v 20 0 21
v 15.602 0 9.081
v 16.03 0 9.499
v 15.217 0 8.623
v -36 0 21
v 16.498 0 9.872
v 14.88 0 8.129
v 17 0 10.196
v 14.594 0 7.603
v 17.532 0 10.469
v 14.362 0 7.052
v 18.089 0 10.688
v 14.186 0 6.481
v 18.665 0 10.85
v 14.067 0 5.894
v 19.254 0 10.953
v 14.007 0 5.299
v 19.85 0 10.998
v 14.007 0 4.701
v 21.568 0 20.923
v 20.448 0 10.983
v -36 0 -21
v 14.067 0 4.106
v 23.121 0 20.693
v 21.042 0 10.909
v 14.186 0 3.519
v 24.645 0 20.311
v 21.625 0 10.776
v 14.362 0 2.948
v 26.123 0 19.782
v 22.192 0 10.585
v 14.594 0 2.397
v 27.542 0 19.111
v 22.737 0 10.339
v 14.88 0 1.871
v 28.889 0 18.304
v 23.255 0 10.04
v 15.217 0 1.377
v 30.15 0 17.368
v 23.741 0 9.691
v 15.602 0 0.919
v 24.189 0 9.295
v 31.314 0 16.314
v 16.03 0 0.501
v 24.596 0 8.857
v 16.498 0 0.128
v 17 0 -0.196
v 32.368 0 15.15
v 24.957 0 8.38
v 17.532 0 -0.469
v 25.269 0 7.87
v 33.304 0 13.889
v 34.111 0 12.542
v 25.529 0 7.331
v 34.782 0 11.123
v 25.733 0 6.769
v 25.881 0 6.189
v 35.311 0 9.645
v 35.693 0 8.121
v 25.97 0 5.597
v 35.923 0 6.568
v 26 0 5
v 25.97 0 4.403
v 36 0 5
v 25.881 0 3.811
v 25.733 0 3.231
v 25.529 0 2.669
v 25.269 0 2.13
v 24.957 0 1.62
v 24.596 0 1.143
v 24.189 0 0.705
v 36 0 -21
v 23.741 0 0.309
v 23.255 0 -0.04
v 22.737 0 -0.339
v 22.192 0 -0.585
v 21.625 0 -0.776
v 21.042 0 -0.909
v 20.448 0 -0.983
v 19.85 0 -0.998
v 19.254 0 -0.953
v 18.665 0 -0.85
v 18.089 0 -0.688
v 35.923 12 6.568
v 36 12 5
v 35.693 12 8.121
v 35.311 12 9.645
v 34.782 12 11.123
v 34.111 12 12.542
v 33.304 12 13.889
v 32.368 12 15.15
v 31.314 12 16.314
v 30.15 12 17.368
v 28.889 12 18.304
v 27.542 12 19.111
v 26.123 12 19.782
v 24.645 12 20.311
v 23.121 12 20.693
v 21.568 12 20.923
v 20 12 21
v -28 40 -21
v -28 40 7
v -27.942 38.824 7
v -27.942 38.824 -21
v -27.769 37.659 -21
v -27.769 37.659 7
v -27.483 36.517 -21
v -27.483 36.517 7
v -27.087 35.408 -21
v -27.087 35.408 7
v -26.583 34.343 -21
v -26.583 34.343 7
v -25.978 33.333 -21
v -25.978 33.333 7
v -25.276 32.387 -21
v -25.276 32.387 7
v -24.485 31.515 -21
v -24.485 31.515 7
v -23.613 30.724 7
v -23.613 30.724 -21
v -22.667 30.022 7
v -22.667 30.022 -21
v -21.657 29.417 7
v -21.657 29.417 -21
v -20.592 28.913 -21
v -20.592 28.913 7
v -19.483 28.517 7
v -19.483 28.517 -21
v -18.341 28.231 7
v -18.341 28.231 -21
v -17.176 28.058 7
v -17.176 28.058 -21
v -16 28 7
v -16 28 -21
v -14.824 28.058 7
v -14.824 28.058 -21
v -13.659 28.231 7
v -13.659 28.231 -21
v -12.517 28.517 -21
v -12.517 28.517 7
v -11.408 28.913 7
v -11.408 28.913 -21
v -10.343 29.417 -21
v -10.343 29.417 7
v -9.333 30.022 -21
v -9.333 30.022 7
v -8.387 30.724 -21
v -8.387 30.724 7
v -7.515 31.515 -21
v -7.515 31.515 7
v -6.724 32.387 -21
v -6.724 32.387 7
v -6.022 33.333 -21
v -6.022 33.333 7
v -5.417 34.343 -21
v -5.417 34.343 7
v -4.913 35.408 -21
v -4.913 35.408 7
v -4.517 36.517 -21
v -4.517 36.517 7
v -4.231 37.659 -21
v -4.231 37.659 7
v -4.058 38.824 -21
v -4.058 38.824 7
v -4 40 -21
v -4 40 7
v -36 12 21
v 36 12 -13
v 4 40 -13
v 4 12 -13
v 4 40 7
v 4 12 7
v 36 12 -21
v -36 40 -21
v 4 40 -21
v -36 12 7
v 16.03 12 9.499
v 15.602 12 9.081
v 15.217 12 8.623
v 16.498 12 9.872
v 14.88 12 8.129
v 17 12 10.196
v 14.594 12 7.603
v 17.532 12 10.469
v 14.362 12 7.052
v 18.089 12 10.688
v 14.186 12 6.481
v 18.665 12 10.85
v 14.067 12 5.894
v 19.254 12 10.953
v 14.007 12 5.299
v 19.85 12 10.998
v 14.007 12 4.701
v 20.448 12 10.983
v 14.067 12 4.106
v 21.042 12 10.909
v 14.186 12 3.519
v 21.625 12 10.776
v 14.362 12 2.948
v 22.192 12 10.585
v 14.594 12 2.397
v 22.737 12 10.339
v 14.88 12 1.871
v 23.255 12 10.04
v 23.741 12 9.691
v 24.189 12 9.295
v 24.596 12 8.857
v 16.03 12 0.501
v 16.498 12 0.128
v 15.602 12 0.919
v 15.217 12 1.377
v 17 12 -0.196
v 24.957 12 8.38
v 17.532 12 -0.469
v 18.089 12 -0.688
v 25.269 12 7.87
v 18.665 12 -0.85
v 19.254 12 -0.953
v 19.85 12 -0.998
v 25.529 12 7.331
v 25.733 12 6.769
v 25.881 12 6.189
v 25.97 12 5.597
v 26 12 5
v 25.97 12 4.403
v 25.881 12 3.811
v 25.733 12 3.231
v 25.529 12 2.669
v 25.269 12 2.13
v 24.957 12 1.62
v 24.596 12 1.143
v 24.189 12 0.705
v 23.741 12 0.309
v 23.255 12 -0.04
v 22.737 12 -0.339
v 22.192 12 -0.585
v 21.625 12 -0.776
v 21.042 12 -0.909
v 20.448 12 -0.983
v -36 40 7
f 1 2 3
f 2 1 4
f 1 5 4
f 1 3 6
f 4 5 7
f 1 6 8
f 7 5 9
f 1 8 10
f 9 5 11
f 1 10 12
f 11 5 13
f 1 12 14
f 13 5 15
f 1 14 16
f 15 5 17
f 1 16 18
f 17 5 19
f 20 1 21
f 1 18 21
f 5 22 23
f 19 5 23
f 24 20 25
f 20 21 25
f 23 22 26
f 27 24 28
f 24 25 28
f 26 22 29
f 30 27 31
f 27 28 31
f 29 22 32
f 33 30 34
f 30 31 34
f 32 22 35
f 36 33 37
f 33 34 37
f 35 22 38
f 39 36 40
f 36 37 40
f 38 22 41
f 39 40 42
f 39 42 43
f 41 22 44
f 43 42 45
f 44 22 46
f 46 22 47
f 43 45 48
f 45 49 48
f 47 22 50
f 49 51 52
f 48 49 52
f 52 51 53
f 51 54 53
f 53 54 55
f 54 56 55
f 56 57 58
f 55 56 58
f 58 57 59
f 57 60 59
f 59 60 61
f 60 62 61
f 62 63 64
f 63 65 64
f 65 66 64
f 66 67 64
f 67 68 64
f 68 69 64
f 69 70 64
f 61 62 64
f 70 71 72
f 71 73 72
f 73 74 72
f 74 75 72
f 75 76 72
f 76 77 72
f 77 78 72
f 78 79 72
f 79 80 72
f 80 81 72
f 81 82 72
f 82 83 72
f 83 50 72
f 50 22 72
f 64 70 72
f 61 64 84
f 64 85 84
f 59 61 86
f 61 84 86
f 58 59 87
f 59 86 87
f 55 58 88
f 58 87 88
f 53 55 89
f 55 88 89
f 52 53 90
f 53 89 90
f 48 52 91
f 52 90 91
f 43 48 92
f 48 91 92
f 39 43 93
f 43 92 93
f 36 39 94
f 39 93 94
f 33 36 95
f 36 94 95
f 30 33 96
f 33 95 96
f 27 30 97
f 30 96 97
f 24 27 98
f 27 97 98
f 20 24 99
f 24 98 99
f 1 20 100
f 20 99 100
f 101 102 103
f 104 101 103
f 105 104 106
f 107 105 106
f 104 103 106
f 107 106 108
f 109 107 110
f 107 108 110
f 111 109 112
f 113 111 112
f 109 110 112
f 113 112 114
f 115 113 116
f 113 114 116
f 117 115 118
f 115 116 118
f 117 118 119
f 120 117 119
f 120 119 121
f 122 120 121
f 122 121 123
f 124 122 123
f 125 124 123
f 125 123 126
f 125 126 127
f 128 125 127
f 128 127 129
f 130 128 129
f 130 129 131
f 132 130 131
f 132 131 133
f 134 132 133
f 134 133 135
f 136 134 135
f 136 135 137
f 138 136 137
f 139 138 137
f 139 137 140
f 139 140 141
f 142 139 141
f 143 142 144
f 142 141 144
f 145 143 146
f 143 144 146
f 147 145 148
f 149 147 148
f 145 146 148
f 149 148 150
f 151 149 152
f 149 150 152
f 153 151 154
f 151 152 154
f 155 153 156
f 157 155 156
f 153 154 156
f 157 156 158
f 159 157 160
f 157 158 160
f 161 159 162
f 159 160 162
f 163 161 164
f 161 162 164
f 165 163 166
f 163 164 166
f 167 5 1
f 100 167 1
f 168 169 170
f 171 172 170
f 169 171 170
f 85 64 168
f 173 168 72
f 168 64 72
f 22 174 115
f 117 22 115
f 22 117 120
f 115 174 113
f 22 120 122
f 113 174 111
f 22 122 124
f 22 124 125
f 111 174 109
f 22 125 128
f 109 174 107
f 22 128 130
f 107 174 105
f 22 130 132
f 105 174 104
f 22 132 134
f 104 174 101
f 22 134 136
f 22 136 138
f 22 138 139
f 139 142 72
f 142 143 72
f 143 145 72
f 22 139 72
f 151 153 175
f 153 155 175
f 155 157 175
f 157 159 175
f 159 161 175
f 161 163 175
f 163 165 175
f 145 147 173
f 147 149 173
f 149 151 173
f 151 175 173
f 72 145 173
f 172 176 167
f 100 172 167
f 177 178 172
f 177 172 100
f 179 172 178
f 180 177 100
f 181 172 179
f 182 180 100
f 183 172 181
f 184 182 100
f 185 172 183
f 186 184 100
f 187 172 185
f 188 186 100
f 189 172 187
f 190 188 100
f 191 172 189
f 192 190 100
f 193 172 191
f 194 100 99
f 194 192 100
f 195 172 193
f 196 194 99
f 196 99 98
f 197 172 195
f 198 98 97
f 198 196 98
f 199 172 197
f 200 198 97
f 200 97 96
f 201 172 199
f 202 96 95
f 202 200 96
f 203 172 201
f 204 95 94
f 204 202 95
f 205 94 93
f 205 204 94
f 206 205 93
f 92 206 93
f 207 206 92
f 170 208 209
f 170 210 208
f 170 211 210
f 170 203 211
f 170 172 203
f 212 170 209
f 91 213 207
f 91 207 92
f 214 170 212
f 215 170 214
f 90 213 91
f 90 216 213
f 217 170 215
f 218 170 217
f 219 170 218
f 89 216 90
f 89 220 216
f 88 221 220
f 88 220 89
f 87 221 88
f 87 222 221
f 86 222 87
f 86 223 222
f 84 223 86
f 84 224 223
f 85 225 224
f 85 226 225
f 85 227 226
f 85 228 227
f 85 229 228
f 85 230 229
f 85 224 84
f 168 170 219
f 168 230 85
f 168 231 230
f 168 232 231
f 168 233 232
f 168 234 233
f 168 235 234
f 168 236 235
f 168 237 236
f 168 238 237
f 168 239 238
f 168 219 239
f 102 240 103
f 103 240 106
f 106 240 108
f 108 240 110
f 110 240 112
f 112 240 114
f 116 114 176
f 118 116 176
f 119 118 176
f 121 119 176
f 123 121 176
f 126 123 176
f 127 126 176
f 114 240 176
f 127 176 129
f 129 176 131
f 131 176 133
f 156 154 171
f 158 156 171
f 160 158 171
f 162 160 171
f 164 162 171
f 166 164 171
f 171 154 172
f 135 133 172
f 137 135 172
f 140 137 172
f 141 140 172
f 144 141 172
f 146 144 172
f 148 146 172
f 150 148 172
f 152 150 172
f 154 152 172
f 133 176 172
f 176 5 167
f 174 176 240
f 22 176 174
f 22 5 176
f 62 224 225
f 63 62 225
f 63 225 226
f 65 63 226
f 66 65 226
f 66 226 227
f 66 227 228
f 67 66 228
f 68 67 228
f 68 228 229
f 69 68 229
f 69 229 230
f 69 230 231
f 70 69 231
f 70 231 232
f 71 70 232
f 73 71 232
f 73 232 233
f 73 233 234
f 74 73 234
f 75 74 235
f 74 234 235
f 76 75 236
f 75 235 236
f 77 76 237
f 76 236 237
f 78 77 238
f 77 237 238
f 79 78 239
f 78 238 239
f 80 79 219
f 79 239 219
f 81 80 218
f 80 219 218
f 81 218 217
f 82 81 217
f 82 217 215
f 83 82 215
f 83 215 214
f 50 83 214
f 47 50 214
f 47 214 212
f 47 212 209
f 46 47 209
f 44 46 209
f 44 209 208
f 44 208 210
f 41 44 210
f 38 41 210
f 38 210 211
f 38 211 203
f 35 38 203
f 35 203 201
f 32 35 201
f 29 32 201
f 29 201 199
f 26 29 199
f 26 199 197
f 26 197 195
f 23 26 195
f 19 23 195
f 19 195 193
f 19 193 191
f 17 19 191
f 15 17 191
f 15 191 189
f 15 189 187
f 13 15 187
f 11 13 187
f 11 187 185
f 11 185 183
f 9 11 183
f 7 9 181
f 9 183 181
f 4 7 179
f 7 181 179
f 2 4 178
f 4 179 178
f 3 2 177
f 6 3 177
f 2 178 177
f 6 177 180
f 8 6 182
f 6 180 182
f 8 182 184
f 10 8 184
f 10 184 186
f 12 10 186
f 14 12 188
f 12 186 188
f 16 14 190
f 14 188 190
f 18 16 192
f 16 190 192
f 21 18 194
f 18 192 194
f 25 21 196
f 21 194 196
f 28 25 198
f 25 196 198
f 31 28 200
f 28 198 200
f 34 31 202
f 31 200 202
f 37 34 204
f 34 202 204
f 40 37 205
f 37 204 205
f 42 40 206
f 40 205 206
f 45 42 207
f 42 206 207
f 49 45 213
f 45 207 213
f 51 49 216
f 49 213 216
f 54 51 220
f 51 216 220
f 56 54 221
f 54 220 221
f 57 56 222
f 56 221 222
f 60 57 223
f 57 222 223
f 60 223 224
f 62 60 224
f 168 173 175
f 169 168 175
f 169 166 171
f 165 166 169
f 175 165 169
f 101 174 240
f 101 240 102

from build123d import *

# Parameters (mm, degrees)
SKETCH1_W           = 72
SKETCH1_H           = 42
BOSS_EXTRUDE1_DEPTH = 12
SKETCH2_W           = 40
SKETCH2_H           = 28
BOSS_EXTRUDE2_DEPTH = 28
SKETCH3_R           = 12
CUT_EXTRUDE1_DEPTH  = 29
BOSS_EXTRUDE3_DEPTH = 8
FILLET3_R           = 16
SKETCH5_R           = 6
CUT_EXTRUDE2_DEPTH  = 13


with BuildPart() as part:
    # Sketch1 → Boss-Extrude1 (new body)
    with BuildSketch(Plane(origin=(0, 0, 0), x_dir=(1, 0, 0), z_dir=(0, 1, 0))):
        Rectangle(SKETCH1_W, SKETCH1_H)
    extrude(amount=BOSS_EXTRUDE1_DEPTH)

    # Sketch2 → Boss-Extrude2 (add)
    with BuildSketch(Plane(origin=(0, 12, 0), x_dir=(1, 0, 0), z_dir=(0, 1, 0))):
        with Locations((-16, 7)):
            Rectangle(SKETCH2_W, SKETCH2_H)
    extrude(amount=BOSS_EXTRUDE2_DEPTH)

    # Sketch3 → Cut-Extrude1 (cut, through all)
    with BuildSketch(Plane.XY.offset(7)):
        with Locations((-16, 40)):
            Circle(SKETCH3_R)
    extrude(amount=-CUT_EXTRUDE1_DEPTH, mode=Mode.SUBTRACT)

    # Sketch4 → Boss-Extrude3 (add)
    with BuildSketch(Plane(origin=(0, 0, -21), x_dir=(-1, 0, 0), z_dir=(0, 0, -1))):
        Polygon((-4, 40), (-4, 12), (-36, 12), align=None)
    extrude(amount=-BOSS_EXTRUDE3_DEPTH)

    # Fillet3
    fillet3_edges = [part.edges().sort_by_distance(p)[0] for p in [
        (36, 6, 21),
    ]]
    fillet(fillet3_edges, radius=FILLET3_R)

    # Sketch5 → Cut-Extrude2 (cut, through all)
    with BuildSketch(Plane(origin=(0, 12, 0), x_dir=(1, 0, 0), z_dir=(0, 1, 0))):
        with Locations((20, -5)):
            Circle(SKETCH5_R)
    extrude(amount=-CUT_EXTRUDE2_DEPTH, mode=Mode.SUBTRACT)


solid = part.part
